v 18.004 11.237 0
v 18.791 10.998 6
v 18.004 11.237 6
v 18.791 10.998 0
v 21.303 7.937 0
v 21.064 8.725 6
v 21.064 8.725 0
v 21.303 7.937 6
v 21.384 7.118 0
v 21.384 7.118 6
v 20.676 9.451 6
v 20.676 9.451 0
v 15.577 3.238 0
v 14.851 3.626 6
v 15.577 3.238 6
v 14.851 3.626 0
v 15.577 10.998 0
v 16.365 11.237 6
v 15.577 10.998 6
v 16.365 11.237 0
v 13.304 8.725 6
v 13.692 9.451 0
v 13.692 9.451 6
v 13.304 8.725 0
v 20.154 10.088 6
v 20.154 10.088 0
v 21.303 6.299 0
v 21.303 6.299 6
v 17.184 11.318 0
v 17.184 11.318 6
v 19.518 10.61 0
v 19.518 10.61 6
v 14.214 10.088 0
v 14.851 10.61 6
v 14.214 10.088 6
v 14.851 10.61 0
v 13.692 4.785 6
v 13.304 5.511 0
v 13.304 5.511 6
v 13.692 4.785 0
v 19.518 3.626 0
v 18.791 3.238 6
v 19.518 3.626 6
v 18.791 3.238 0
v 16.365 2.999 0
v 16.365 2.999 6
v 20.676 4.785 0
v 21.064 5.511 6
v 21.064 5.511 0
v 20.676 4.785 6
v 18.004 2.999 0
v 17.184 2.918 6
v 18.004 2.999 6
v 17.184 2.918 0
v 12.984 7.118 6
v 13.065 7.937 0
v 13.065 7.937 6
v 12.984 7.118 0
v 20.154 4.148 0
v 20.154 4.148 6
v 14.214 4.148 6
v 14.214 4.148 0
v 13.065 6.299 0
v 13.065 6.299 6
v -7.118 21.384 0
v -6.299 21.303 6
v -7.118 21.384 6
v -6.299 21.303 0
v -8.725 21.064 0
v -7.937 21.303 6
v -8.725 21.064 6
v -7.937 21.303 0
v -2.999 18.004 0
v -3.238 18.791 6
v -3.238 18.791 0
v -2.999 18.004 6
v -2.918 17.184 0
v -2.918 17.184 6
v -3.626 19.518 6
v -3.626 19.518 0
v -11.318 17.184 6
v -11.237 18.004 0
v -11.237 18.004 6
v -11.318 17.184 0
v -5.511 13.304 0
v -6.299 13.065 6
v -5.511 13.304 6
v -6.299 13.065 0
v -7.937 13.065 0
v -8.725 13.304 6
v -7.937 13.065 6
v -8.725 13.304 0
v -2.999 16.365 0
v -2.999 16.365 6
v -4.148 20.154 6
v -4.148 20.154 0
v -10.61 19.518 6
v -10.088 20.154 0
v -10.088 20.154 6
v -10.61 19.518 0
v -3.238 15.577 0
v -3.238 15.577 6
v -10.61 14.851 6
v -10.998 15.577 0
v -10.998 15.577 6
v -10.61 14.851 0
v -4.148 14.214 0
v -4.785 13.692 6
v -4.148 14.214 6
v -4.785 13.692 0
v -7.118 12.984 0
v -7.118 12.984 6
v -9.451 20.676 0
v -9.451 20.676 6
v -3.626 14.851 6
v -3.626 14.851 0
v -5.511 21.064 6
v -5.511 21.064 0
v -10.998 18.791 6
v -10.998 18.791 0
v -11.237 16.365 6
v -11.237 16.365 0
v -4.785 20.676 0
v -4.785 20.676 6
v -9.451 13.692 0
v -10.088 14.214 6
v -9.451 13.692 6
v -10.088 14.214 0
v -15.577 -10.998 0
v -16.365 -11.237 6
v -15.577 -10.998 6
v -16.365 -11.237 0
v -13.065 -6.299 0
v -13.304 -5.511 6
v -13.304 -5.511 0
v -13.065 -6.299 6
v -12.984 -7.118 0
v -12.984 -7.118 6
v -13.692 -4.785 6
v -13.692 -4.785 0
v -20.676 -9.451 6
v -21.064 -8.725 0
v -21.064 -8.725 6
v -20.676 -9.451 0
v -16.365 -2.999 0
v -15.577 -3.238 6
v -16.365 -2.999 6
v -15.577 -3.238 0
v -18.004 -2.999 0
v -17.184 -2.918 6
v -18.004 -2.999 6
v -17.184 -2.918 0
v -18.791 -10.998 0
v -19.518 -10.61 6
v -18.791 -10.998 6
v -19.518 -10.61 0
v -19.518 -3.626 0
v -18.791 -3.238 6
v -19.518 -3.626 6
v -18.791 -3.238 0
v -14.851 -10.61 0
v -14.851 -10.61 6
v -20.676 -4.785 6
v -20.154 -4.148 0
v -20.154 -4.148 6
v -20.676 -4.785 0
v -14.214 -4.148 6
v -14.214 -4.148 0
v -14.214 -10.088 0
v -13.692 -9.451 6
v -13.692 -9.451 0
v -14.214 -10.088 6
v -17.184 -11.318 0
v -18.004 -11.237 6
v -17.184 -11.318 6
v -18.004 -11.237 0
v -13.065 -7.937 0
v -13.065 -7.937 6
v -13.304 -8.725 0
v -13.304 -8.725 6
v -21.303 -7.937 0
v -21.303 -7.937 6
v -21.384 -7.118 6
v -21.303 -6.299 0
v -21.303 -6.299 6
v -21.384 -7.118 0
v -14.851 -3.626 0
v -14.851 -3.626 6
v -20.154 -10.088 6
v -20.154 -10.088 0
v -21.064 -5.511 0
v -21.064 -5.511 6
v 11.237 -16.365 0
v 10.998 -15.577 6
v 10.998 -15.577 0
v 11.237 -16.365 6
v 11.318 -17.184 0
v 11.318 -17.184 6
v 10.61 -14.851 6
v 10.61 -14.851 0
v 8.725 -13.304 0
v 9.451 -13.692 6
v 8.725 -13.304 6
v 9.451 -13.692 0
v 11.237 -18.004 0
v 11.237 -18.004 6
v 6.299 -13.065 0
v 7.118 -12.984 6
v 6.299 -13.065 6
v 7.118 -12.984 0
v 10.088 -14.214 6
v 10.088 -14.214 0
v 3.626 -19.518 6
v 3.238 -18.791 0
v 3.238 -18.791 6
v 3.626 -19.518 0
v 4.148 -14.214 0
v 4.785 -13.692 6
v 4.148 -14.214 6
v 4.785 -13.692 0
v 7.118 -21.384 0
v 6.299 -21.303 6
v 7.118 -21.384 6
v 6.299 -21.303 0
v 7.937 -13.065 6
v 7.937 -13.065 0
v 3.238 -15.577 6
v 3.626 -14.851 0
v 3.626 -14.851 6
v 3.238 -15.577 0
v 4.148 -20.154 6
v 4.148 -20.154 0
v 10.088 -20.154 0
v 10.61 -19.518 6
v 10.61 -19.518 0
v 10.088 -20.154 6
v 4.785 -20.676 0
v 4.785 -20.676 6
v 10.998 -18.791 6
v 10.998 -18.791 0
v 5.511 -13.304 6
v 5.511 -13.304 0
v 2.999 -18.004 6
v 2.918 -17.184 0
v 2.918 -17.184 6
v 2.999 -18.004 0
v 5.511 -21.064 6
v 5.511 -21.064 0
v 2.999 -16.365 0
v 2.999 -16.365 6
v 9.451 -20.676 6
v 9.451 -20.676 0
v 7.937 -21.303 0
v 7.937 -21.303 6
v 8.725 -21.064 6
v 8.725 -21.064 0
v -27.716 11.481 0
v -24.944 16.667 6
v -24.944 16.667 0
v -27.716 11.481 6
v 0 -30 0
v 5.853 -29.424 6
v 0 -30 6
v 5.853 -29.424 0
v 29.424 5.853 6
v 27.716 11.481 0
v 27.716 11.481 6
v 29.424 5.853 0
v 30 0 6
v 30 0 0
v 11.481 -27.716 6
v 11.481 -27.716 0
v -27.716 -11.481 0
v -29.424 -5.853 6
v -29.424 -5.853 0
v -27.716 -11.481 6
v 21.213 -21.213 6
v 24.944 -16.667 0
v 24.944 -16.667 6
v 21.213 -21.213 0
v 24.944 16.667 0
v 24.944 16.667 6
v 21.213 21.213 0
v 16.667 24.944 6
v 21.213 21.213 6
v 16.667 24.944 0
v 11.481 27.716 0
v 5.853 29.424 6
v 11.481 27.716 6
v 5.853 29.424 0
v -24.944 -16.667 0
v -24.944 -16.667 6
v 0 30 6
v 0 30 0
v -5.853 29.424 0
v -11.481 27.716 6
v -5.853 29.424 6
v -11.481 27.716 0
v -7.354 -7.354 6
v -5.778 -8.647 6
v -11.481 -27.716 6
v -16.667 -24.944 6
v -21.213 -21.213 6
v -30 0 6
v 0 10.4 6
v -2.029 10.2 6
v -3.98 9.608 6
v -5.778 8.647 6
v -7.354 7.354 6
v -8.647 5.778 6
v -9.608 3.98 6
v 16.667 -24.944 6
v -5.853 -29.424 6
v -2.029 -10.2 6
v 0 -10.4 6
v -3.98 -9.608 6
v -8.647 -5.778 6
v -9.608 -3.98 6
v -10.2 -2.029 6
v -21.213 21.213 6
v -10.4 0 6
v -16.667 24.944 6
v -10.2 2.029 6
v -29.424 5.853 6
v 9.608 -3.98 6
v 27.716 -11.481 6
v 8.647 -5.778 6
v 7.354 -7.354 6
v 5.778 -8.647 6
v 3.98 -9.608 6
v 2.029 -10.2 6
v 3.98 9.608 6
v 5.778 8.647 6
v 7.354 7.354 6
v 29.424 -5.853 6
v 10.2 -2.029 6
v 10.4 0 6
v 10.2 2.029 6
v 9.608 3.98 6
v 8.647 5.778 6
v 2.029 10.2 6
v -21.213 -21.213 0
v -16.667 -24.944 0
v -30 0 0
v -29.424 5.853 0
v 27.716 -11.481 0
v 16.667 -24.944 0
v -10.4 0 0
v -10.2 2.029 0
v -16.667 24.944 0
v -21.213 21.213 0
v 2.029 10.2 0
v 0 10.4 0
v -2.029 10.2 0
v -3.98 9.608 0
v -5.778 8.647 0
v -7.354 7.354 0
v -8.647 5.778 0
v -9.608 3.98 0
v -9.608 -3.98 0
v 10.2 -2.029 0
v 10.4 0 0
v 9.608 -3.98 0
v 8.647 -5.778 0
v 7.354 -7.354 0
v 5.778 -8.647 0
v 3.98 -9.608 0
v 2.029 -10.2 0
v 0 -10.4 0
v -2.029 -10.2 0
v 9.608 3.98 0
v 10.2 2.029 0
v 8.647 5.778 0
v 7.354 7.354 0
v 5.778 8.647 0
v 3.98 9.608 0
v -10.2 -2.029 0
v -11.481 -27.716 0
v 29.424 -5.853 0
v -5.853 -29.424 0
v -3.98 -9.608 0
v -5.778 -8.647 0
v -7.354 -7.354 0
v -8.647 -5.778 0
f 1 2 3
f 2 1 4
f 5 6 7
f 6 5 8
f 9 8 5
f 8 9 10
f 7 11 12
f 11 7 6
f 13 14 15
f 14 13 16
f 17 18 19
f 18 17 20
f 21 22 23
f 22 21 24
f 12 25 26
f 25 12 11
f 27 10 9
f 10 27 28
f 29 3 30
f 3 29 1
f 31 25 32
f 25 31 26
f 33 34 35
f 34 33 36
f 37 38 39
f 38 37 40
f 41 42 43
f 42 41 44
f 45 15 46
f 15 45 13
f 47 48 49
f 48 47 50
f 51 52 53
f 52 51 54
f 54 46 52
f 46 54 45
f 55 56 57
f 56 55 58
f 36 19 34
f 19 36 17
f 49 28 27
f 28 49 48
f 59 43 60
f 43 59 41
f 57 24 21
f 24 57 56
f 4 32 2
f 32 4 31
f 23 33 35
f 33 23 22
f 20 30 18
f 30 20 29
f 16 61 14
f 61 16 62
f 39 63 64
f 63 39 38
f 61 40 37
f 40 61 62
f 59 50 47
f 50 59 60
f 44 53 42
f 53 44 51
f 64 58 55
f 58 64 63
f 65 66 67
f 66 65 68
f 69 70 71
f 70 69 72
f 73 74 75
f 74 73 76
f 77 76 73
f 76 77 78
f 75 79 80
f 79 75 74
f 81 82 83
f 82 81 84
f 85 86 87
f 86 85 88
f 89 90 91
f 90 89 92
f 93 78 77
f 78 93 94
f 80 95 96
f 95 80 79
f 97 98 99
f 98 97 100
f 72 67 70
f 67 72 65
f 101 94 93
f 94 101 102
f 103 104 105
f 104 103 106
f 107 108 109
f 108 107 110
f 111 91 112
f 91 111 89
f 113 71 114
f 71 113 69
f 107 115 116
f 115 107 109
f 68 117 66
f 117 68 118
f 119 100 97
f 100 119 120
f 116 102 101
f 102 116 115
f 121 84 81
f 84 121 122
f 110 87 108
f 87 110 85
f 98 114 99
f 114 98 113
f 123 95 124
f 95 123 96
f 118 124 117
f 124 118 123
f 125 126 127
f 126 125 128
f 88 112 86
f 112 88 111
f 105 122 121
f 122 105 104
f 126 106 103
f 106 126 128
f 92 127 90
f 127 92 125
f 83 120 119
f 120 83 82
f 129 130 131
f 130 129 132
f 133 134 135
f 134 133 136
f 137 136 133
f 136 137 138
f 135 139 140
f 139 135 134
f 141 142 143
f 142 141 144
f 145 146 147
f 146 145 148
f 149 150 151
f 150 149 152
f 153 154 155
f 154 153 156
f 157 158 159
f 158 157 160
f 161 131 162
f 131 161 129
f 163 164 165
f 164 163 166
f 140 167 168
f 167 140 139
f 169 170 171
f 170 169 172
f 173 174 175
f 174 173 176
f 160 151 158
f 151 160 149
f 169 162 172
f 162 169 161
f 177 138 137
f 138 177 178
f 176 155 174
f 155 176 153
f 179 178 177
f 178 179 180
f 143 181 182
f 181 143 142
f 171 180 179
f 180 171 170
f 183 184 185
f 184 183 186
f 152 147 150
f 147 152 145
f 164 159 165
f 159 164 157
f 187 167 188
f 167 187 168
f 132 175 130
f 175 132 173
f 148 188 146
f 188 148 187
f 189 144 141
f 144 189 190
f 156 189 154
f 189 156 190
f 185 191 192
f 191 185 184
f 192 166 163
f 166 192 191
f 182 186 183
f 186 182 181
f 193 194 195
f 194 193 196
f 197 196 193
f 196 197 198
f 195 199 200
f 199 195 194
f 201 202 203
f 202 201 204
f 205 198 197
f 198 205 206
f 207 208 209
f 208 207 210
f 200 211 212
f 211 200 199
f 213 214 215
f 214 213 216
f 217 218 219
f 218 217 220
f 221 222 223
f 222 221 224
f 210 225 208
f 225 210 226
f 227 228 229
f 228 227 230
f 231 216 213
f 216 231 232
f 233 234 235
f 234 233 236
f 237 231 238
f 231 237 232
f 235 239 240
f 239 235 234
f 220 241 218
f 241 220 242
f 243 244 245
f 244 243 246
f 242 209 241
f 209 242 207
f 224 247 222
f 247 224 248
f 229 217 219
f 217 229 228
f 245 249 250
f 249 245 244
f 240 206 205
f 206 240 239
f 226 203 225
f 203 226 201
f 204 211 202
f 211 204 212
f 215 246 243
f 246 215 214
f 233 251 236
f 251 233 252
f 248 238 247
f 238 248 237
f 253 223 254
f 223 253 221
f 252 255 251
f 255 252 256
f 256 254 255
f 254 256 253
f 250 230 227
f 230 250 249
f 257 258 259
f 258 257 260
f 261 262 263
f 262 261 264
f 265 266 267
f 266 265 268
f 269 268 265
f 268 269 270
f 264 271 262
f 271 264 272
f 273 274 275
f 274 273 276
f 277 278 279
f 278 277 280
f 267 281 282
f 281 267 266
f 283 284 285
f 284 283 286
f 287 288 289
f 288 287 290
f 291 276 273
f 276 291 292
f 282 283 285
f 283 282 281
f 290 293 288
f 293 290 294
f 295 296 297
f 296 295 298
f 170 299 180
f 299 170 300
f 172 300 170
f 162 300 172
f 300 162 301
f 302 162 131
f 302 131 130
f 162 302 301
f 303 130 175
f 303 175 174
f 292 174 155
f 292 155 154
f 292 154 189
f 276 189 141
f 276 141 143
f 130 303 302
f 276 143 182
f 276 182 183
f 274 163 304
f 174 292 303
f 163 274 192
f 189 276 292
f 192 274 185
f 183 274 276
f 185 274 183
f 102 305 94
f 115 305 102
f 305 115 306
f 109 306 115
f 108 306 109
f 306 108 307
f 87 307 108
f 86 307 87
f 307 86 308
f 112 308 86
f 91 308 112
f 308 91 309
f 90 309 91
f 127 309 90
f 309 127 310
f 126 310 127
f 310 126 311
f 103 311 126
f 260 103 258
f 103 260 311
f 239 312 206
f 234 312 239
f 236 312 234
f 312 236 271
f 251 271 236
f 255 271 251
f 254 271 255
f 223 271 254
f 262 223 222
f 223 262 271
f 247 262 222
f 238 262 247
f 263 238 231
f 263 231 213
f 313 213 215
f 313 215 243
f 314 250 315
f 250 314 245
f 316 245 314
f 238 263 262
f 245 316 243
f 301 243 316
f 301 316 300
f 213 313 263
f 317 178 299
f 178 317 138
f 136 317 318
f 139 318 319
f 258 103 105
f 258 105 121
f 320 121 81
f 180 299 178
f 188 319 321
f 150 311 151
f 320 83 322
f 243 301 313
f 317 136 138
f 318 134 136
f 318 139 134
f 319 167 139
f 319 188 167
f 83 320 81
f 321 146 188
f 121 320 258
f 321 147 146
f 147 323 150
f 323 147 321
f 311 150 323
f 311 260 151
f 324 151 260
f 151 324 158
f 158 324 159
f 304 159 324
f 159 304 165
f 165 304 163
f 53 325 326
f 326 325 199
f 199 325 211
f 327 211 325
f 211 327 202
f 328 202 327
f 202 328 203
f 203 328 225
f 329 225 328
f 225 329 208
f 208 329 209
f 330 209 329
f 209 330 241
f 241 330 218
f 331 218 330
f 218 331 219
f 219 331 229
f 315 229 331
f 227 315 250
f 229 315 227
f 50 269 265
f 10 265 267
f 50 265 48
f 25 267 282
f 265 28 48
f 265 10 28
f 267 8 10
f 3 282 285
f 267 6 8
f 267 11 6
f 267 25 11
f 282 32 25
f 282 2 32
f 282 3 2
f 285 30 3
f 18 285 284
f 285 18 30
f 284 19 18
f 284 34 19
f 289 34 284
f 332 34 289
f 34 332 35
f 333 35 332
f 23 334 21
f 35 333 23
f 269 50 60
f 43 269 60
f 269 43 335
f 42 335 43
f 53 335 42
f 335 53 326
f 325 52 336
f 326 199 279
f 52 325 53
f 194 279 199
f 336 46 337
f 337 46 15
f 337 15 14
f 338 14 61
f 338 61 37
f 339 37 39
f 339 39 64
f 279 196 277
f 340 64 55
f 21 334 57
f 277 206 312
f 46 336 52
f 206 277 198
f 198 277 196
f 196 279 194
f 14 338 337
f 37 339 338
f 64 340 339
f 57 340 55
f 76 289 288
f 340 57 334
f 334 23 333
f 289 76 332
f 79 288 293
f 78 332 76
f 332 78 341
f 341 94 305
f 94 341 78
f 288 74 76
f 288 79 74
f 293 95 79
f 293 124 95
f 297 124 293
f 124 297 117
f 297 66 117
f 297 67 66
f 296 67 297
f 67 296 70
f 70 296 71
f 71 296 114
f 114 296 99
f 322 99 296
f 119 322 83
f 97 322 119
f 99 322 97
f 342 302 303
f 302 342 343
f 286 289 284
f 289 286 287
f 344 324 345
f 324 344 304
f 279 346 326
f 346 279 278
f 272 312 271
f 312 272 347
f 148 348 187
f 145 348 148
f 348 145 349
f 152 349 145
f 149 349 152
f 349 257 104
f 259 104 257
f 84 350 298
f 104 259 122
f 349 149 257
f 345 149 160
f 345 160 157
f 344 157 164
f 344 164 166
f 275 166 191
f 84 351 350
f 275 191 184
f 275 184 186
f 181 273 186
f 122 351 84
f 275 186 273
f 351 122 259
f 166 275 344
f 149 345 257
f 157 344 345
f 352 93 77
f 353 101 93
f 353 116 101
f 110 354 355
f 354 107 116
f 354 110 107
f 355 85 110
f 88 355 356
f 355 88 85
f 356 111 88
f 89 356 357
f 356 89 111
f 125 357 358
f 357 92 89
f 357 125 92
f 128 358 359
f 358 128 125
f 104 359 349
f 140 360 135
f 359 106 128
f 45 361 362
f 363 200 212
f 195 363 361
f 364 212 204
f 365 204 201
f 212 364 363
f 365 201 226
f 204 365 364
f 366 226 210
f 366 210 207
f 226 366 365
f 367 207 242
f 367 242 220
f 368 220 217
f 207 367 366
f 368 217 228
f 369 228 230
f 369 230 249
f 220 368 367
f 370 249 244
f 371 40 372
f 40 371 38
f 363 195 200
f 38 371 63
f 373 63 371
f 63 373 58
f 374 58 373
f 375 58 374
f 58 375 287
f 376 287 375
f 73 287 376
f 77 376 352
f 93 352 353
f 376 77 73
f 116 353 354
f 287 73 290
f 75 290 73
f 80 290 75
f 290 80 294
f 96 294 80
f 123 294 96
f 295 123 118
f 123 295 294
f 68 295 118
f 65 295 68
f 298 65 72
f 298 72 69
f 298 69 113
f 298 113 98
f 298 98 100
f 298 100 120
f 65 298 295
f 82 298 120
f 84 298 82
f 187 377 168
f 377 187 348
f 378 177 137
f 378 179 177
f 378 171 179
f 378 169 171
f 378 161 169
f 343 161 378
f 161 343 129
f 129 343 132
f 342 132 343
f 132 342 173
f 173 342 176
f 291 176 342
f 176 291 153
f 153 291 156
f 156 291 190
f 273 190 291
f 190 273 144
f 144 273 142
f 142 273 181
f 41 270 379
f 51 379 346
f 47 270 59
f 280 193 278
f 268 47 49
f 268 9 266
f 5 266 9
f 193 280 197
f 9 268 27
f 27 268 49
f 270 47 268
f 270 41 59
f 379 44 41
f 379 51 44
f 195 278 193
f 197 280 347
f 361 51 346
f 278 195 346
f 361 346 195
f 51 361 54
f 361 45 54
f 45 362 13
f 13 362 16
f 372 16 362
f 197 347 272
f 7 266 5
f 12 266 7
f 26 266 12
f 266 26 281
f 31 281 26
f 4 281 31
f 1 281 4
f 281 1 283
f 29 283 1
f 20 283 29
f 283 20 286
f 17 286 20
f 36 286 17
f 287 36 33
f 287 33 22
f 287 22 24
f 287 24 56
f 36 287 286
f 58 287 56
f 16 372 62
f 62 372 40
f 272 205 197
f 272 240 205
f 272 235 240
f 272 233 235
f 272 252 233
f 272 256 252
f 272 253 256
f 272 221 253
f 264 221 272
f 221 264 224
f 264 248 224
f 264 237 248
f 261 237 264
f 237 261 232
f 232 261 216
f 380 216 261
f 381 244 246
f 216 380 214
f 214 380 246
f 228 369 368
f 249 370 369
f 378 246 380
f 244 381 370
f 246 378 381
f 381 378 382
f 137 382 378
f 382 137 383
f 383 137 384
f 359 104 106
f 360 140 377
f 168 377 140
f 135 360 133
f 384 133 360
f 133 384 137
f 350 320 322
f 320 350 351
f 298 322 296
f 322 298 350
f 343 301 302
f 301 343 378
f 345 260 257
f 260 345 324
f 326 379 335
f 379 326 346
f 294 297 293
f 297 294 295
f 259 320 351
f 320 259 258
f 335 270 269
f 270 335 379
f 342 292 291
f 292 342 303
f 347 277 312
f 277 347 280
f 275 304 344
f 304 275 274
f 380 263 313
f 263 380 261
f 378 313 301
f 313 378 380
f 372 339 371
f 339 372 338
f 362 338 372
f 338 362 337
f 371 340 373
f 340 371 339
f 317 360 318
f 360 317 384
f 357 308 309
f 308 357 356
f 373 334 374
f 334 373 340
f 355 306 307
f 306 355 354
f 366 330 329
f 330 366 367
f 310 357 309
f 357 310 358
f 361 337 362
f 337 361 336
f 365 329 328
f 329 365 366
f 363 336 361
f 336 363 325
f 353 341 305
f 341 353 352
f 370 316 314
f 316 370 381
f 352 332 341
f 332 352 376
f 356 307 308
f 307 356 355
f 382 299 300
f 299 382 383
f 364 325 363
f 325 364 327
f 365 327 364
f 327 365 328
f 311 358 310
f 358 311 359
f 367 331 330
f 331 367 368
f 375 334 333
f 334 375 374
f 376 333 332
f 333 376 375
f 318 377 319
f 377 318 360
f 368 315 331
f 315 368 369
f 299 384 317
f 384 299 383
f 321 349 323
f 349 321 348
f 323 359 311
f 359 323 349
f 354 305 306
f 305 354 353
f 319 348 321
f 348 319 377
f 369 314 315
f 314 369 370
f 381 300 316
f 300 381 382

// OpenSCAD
$fn = 32;

// ----------------------------------------------------------------------
// Flange Ø60 x 6
// 4 holes on a Ø37.2 bolt circle, bolted joints
// ----------------------------------------------------------------------

// --- parameters (mm) ---
flange_d = 60;     // outside diameter of the flange
thickness = 6;     // flange thickness
holes = 4;         // number of bolt holes
pcd = 37.2;        // bolt circle diameter
start_deg = 22.5;  // angle of the first hole, from +X
hole_d = 8.4;      // bolt hole diameter
bore_d = 20.8;     // central through bore
hub_d = 32.8;      // hub outside diameter
hub_h = 0;         // hub height above the flange face (0 = no hub)

// --- derived feature positions (mm) ---
height = thickness + hub_h;  // = 6   overall height of the part
pcd_r = pcd / 2;             // = 18.6   bolt circle radius
hole_step = 360 / holes;     // = 90   angular pitch
feature_centers = [
  [pcd_r * cos(start_deg + 0 * hole_step), pcd_r * sin(start_deg + 0 * hole_step)],
  [pcd_r * cos(start_deg + 1 * hole_step), pcd_r * sin(start_deg + 1 * hole_step)],
  [pcd_r * cos(start_deg + 2 * hole_step), pcd_r * sin(start_deg + 2 * hole_step)],
  [pcd_r * cos(start_deg + 3 * hole_step), pcd_r * sin(start_deg + 3 * hole_step)]
];   // bolt hole centres on the pitch circle

// flange disc, every hole and the bore cut straight through
difference() {
  union() {
    cylinder(d = flange_d, h = thickness);
  }
  translate([0, 0, -1]) cylinder(d = bore_d, h = height + 2);  // bore, through
  for (centre = feature_centers)
    translate([centre[0], centre[1], -1]) cylinder(d = hole_d, h = thickness + 2);
}
